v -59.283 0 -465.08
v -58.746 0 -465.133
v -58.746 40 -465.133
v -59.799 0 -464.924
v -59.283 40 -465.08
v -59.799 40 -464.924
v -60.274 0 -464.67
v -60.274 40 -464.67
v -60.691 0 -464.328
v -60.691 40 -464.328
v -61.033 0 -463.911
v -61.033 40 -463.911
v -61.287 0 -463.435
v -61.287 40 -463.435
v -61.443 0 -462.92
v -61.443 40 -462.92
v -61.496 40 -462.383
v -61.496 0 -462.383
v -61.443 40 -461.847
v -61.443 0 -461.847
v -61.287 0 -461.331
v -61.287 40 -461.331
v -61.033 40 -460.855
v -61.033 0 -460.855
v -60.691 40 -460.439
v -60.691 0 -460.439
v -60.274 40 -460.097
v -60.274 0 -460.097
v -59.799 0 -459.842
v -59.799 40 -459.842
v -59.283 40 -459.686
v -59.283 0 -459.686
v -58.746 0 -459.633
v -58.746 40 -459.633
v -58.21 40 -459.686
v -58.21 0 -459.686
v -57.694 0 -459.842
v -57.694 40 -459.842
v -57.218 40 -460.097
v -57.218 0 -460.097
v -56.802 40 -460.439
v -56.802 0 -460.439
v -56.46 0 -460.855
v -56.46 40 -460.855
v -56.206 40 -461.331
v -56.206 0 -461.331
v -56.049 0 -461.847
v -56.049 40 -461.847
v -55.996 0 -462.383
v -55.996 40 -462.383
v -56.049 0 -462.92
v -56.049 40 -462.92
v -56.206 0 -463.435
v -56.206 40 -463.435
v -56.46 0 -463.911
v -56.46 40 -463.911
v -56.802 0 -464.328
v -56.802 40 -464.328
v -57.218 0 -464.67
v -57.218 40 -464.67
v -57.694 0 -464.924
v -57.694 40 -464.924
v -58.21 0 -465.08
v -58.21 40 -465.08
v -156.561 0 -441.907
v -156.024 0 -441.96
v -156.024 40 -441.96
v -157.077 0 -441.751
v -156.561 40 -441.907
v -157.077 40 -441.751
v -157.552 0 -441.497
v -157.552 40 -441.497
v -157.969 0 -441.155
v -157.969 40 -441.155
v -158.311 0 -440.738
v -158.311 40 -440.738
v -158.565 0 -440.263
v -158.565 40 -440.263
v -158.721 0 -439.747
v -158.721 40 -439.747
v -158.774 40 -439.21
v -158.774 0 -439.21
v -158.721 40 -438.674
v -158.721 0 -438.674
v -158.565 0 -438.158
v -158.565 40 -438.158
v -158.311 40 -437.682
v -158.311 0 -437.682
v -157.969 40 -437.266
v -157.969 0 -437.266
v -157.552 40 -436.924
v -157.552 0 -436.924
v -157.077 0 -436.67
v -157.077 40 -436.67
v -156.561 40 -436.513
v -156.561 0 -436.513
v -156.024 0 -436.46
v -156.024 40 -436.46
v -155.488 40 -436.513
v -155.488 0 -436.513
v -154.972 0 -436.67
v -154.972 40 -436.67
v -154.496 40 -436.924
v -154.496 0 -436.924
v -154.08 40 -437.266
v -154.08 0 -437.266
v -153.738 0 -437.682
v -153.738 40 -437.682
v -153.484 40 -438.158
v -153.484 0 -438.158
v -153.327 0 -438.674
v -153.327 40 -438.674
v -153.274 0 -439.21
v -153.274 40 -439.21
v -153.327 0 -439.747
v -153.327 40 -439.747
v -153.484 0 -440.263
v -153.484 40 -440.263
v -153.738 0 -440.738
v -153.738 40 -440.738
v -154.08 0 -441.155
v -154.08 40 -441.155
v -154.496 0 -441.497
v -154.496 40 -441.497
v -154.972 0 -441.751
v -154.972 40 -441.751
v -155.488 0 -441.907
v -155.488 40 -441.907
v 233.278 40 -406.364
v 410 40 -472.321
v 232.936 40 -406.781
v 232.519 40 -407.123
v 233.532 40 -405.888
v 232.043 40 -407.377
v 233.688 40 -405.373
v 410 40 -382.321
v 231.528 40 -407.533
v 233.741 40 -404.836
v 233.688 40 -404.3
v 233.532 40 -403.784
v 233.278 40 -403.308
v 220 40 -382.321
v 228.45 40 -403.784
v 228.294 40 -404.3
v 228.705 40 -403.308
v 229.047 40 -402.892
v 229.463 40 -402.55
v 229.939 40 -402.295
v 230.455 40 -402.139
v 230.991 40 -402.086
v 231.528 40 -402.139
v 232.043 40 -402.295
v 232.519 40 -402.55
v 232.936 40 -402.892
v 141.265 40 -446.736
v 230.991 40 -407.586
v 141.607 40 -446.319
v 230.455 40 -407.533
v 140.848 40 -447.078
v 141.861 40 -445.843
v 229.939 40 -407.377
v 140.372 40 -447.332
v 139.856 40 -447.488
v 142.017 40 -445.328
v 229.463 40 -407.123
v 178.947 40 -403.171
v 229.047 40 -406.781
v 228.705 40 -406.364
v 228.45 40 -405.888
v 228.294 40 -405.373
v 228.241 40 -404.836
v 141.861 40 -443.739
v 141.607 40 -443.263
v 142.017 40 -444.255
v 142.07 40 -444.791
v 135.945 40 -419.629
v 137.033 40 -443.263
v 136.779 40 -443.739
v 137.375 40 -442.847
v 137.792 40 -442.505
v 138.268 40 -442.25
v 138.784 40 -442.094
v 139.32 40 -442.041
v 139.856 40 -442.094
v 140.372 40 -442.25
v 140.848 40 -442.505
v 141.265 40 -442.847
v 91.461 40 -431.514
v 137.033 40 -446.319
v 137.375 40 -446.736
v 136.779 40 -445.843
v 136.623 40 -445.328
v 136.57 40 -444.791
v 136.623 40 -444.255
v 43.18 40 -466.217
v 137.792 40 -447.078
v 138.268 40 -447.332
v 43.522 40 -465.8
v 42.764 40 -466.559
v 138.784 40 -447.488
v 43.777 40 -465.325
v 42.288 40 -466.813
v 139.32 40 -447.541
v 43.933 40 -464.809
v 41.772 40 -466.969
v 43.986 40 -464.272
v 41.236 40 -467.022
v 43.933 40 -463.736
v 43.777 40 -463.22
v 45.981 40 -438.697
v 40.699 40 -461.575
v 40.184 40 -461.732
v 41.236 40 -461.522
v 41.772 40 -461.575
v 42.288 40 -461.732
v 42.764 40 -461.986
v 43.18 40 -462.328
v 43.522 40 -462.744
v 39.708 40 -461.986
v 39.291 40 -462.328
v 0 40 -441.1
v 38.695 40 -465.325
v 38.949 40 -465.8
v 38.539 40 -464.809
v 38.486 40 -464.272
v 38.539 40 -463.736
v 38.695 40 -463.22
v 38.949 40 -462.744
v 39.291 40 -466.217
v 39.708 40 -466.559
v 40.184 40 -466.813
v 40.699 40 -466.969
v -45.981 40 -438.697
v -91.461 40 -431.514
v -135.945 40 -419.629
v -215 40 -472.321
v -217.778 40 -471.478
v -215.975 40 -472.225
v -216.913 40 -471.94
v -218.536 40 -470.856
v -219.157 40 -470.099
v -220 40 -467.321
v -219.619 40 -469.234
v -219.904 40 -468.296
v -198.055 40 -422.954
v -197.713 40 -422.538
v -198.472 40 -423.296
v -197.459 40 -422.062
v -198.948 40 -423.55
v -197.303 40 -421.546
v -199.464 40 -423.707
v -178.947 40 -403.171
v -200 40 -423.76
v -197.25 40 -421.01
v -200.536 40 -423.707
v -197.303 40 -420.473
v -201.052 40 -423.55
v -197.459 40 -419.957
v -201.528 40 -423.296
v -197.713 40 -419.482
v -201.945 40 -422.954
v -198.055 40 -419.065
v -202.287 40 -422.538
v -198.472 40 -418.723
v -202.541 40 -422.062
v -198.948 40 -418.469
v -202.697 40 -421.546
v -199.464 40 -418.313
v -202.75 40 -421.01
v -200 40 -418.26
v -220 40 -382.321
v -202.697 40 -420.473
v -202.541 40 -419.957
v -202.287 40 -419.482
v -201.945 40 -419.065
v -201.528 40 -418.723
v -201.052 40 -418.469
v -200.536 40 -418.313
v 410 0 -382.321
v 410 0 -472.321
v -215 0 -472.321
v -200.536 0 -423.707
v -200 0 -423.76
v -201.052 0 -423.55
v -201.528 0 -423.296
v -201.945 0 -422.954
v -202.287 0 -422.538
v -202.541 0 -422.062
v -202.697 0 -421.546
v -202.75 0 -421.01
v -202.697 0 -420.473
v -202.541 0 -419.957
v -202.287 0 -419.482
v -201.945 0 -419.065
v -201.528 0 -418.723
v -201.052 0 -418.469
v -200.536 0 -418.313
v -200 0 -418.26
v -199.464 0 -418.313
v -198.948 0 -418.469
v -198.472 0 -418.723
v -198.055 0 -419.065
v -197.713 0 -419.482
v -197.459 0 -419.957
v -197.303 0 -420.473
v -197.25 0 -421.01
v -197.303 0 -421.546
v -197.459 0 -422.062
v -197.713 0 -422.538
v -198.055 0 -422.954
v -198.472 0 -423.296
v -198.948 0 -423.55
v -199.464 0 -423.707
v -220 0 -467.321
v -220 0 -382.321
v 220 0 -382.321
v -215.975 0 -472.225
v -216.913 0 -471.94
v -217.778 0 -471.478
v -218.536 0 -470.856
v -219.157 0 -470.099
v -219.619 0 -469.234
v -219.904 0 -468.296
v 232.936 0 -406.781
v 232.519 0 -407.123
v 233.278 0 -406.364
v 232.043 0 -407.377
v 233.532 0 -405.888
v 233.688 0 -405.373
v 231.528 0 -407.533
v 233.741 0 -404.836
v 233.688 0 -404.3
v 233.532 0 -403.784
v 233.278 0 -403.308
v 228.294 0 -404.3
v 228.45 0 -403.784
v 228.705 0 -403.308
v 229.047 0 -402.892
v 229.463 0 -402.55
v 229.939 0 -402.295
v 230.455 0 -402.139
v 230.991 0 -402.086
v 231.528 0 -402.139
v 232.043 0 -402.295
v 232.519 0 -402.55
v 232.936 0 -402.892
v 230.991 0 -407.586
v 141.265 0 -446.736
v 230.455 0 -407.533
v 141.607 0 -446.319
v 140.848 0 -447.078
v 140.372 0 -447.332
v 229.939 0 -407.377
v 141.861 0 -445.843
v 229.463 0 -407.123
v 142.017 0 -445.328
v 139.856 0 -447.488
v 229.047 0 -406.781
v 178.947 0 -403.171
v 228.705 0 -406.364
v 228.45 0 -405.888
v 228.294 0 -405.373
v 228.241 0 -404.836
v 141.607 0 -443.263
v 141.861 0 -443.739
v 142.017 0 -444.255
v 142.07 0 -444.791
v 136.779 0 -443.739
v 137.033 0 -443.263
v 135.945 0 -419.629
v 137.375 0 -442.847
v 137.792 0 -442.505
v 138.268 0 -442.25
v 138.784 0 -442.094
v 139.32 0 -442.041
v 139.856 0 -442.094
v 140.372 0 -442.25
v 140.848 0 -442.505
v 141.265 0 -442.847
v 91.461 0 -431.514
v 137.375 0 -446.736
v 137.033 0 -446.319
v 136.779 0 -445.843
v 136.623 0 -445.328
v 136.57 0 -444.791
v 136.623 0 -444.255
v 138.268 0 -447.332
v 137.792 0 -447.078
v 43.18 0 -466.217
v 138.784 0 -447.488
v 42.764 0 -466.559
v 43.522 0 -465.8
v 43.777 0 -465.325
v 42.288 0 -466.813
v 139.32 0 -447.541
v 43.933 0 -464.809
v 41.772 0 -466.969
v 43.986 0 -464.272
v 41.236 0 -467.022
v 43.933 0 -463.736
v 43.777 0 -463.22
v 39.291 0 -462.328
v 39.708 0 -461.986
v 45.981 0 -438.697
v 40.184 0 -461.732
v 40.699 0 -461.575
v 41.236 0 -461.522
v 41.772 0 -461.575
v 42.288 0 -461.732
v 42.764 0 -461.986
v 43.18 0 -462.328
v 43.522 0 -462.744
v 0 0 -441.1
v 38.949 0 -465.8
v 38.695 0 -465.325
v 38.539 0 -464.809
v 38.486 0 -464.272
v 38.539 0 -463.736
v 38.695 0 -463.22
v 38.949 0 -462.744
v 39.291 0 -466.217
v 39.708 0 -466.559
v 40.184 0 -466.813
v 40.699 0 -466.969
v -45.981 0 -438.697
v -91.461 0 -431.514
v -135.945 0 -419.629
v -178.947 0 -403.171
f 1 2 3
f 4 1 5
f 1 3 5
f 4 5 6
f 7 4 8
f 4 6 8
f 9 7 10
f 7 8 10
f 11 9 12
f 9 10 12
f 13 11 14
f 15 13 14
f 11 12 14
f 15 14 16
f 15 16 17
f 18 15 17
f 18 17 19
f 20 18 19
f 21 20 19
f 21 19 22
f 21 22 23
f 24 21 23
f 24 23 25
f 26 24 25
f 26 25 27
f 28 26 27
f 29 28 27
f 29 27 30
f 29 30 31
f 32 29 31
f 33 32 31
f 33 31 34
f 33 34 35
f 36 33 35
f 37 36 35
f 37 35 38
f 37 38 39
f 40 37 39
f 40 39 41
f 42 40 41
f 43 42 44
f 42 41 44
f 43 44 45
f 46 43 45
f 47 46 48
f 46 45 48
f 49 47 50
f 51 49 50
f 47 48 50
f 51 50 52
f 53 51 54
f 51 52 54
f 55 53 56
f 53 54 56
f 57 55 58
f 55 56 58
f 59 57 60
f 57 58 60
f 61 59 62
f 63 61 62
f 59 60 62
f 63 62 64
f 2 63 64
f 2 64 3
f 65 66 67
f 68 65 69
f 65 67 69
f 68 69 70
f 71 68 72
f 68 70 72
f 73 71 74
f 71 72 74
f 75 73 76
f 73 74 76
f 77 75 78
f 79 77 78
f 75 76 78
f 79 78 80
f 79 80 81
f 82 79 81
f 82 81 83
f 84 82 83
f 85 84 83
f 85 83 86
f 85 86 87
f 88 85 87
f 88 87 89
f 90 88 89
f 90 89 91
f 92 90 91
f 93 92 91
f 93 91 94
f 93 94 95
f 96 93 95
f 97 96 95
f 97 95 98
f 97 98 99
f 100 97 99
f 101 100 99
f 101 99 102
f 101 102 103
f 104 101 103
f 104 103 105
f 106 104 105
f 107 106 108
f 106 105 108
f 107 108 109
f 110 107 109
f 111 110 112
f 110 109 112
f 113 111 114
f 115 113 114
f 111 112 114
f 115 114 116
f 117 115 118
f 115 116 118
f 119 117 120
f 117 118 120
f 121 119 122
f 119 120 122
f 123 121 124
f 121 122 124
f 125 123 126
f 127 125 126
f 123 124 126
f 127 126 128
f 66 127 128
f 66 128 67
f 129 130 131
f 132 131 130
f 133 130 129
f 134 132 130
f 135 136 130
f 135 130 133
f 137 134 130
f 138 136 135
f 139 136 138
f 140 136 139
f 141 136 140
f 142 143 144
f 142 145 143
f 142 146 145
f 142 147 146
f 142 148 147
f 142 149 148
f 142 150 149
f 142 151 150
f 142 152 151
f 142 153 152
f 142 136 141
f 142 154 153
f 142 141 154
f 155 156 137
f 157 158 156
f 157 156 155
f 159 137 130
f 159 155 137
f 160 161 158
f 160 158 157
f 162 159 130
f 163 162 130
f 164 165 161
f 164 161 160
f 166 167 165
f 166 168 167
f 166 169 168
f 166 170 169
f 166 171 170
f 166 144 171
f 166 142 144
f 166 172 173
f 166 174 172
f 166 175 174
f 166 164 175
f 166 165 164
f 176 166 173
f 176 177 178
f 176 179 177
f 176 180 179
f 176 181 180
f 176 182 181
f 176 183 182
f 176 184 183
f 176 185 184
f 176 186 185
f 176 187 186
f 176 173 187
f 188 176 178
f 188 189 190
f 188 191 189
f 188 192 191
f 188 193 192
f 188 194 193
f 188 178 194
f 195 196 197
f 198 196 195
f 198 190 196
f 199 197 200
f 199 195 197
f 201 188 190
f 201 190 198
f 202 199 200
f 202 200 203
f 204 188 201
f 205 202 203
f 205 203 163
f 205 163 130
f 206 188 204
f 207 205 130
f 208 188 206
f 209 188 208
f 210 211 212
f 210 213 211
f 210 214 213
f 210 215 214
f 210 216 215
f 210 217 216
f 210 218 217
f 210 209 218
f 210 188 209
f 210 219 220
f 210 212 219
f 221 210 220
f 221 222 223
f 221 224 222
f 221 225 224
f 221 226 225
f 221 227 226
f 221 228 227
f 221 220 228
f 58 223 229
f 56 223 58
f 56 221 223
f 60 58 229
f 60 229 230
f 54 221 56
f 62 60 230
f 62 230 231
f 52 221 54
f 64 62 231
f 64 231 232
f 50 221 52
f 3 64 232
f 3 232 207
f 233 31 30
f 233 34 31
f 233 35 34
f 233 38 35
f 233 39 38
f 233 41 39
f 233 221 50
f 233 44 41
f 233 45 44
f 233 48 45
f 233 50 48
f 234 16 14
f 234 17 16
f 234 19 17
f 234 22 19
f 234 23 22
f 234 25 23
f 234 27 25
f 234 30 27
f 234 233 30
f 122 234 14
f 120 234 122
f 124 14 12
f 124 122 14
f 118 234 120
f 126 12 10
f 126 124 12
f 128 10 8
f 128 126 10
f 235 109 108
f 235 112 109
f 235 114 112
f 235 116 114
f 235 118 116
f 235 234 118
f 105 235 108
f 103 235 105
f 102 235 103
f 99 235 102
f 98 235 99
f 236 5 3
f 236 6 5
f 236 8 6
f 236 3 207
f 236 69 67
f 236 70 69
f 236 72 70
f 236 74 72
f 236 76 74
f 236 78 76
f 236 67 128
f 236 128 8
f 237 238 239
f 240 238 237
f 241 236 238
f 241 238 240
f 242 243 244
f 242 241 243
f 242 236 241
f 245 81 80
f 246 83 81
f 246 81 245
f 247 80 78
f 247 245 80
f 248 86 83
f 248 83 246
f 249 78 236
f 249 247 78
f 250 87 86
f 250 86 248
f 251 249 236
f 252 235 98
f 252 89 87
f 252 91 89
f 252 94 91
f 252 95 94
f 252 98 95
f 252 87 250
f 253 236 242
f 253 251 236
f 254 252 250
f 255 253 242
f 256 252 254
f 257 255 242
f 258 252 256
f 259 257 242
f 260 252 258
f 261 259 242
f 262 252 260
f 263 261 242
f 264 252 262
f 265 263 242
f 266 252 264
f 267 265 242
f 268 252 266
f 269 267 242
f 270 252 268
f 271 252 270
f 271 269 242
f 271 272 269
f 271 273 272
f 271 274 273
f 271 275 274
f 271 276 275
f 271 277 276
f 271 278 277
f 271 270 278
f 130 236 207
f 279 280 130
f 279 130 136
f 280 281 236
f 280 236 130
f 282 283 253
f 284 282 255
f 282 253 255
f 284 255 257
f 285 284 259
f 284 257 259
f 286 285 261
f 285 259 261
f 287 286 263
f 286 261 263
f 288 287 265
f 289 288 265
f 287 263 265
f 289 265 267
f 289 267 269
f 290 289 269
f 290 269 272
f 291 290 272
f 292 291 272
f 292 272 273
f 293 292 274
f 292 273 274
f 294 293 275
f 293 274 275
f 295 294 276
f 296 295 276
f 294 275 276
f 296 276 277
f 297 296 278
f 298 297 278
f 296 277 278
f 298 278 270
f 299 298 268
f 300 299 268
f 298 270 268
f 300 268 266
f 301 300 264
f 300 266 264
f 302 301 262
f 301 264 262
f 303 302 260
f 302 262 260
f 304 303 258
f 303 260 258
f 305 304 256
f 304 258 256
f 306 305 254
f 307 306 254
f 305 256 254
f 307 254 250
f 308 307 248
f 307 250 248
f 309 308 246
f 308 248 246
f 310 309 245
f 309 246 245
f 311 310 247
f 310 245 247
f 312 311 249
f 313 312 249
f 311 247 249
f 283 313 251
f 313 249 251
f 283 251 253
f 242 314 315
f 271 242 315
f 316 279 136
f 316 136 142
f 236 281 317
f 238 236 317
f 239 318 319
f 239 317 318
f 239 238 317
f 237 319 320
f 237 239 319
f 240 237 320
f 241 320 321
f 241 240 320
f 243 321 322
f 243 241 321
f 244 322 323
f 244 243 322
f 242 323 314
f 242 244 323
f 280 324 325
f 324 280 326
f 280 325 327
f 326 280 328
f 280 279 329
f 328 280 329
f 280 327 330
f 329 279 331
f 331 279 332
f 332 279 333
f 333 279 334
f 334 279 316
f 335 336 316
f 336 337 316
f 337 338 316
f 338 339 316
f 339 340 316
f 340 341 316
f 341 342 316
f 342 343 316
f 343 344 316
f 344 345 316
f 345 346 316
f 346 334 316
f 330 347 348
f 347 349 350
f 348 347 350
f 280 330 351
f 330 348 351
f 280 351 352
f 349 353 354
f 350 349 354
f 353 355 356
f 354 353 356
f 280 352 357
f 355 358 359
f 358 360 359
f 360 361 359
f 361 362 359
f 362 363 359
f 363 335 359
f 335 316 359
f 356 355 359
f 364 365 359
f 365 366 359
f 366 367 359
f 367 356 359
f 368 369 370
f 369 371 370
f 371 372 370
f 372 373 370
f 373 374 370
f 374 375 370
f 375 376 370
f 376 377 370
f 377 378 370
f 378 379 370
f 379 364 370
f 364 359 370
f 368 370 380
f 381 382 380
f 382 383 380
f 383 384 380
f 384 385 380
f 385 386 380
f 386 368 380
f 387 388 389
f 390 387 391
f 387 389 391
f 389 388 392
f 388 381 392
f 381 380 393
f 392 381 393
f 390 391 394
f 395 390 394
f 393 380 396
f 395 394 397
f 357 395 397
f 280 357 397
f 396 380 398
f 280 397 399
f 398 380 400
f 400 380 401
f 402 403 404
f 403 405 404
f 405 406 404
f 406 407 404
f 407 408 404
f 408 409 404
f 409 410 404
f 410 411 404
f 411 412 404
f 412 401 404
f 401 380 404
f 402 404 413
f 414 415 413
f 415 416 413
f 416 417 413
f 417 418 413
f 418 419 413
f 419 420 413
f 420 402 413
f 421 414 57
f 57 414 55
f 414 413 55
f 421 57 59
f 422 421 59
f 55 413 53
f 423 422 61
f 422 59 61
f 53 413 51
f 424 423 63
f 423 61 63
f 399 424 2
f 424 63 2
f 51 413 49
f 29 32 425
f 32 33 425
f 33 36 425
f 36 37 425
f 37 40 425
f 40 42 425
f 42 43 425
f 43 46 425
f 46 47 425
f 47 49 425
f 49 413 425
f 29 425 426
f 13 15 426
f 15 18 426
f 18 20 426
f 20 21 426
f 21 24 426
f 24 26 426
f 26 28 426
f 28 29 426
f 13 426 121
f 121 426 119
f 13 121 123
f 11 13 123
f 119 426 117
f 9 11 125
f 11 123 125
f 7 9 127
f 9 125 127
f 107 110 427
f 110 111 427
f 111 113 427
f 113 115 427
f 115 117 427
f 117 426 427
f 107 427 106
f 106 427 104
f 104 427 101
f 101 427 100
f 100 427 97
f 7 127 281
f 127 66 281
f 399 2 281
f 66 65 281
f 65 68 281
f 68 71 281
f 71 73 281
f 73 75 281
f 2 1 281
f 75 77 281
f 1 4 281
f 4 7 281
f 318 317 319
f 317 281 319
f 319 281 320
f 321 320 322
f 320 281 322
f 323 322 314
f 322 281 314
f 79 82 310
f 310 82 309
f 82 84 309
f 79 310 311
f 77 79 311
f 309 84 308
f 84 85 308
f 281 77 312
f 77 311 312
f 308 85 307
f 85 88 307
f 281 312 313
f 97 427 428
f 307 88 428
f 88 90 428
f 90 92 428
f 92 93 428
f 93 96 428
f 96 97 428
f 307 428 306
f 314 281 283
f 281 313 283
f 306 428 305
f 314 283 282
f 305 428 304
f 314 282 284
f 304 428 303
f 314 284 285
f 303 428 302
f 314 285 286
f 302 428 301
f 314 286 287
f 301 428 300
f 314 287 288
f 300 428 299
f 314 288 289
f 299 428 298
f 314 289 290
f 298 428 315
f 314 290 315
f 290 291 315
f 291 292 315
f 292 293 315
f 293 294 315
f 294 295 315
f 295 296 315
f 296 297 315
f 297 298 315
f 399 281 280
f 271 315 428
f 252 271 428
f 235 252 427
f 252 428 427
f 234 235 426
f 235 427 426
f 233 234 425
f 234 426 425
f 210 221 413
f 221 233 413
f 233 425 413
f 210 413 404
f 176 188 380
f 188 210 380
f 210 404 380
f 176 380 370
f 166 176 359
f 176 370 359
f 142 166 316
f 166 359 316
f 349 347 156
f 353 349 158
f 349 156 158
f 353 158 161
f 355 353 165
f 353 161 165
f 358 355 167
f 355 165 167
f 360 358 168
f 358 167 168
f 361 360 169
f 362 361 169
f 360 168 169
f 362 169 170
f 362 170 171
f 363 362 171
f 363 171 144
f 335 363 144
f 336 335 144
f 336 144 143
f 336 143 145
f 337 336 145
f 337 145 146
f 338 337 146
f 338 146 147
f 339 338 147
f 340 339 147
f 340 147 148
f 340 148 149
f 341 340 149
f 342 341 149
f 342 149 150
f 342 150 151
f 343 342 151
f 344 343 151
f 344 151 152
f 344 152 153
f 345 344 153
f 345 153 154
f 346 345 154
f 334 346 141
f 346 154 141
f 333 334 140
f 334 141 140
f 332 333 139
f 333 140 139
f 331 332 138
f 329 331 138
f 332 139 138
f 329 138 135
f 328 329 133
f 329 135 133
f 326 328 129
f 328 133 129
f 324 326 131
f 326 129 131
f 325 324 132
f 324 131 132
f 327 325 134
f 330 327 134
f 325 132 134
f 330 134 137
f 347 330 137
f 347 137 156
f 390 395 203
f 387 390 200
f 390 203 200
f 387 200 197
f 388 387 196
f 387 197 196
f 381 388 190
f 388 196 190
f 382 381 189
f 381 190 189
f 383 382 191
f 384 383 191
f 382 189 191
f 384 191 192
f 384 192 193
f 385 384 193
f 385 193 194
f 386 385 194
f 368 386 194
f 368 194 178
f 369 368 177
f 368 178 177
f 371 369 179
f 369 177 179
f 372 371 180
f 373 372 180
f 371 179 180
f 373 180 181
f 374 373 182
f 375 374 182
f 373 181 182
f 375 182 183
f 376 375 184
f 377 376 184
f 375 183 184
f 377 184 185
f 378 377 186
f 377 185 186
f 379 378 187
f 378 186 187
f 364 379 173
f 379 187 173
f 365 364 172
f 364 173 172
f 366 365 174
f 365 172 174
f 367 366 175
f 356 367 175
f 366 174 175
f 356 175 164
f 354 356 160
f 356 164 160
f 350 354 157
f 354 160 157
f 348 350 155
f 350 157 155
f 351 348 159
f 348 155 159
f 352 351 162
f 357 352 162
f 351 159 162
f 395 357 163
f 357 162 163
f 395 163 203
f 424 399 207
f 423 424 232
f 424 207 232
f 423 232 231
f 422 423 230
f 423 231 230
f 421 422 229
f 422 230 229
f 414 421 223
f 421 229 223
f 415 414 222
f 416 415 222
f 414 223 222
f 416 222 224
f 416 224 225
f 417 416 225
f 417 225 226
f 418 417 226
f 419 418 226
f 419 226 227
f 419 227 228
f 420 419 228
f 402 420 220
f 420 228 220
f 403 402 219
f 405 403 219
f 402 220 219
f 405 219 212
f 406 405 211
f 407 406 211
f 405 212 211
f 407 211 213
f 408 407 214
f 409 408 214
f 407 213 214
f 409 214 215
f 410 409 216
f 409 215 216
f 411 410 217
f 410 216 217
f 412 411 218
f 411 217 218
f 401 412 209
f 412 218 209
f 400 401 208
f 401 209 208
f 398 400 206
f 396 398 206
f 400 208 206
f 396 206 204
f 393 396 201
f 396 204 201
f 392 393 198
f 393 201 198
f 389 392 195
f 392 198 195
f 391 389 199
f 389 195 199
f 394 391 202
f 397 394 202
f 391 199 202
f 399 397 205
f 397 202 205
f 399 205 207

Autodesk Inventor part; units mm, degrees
ref_plane "YZ Plane" through (0, 0, 0) normal (1, 0, 0) x (0, 1, 0)
ref_plane "XZ Plane" through (0, 0, 0) normal (0, 1, 0) x (-1, 0, 0)
ref_plane "XY Plane" through (0, 0, 0) normal (0, 0, 1) x (1, 0, 0)
sketch "Sketch1" plane through (0, 0, 0) normal (0, 1, 0) x (-1, 0, 0)
  line L0 (0, 329.241) -> (0, -329.241) construction
  line L1 (203.5937, 0) -> (-203.5937, 0) construction
  arc A0 (-441.1, 0) -> (220, -382.3208) centre (0, 0) ccw
  line L2 (-441.1, 0) -> (-441.1, 400)
  line L3 (-441.1, 400) -> (-500, 400)
  line L4 (-500, 400) -> (-500, -500)
  line L5 (-500, -500) -> (220, -500)
  line L6 (220, -500) -> (220, -382.3208)
  dimension "d0" = 500
  dimension "d1" = 400
  dimension "d2" = 500
  dimension "d3" = 441.1
  dimension "d4" = 720
extrude "Extrusion1" add sketch "Sketch1" along normal blind 40
sketch "Sketch3" plane through (0, 0, 0) normal (0, -1, 0) x (1, 0, 0)
  line L0 (-480, -472.3208) -> (410, -472.3208)
  line L1 (410, -472.3208) -> (410, -382.3208)
  line L2 (410, -382.3208) -> (-480, -382.3208)
  line L3 (-480, -382.3208) -> (-480, -472.3208)
  arc A0 (-220, -382.3208) -> (441.1, 0) centre (0, 0) ccw projected
  line L4 (500, 400) -> (500, -500) projected
  line L5 (-944.7434, 629.3425) -> (927.6453, 629.3425)
  line L6 (927.6453, 629.3425) -> (927.6453, -768.0218)
  line L7 (927.6453, -768.0218) -> (-944.7434, -768.0218)
  line L8 (-944.7434, -768.0218) -> (-944.7434, 629.3425)
  dimension "d44" = 890
  dimension "d45" = 90
  dimension "d71" = 90
sketch "Sketch4" plane through (0, 0, 0) normal (0, -1, 0) x (1, 0, 0)
  line L0 (441.1, 400) -> (500, 400) construction
  line L1 (441.1, 0) -> (441.1, 400) construction
  arc A0 (-220, -382.3208) -> (441.1, 0) centre (0, 0) ccw construction
  line L2 (464.3817, -39.9852) -> (0, 0) construction
  line L3 (0, 0) -> (445.1648, -138.1214) construction
  line L4 (423.7332, -194.1633) -> (0, 0) construction
  line L5 (360.2723, -295.7246) -> (0, 0) construction
  line L6 (289.0138, -365.6778) -> (0, 0) construction
  line L7 (389.8771, -255.4312) -> (0, 0) construction
  line L8 (326.5218, -332.615) -> (0, 0) construction
  line L9 (230.9911, -404.8361) -> (0, 0) construction
  line L10 (139.32, -444.7911) -> (0, 0) construction
  line L11 (41.2359, -464.2723) -> (0, 0) construction
  line L12 (464.3817, -39.9852) -> (445.1648, -138.1214) construction
  line L13 (445.1648, -138.1214) -> (423.7332, -194.1633) construction
  line L14 (423.7332, -194.1633) -> (389.8771, -255.4312) construction
  line L15 (389.8771, -255.4312) -> (360.2723, -295.7246) construction
  line L16 (360.2723, -295.7246) -> (326.5218, -332.615) construction
  line L17 (326.5218, -332.615) -> (289.0138, -365.6778) construction
  line L18 (289.0138, -365.6778) -> (230.9911, -404.8361) construction
  line L19 (230.9911, -404.8361) -> (139.32, -444.7911) construction
  line L20 (139.32, -444.7911) -> (41.2359, -464.2723) construction
  line L21 (-58.7462, -462.3831) -> (0, 0) construction
  line L22 (-156.0243, -439.2102) -> (0, 0) construction
  line L23 (-200, -421.0098) -> (0, 0) construction
  line L24 (41.2359, -464.2723) -> (-58.7462, -462.3831) construction
  line L25 (-58.7462, -462.3831) -> (-156.0243, -439.2102) construction
  line L26 (-200, -421.0098) -> (-156.0243, -439.2102) construction
  line L27 (-220, -500) -> (-220, -382.3208) construction
  point P0 (466.1, 360)
  point P1 (466.1, 260)
  point P2 (466.1, 160)
  point P3 (466.1, 60)
  dimension "d50" = 40
  dimension "d51" = 100
  dimension "d52" = 100
  dimension "d53" = 100
  dimension "d54" = 25
  dimension "d55" = 466.1
  dimension "d56" = 100
  dimension "d57" = 100
  dimension "d58" = 60
  dimension "d59" = 70
  dimension "d60" = 50
  dimension "d61" = 70
  dimension "d62" = 100
  dimension "d63" = 20
hole "Hole1" at (-200, 0, -421.0098) at (-156.0243, 0, -439.2102) at (-58.7462, 0, -462.3831) at (41.2359, 0, -464.2723) at (139.32, 0, -444.7911) at (230.9911, 0, -404.8361) at (289.0138, 0, -365.6778) at (326.5218, 0, -332.615) at (360.2723, 0, -295.7246) at (389.8771, 0, -255.4312) at (423.7332, 0, -194.1633) at (445.1648, 0, -138.1214) at (464.3817, 0, -39.9852) at (466.1, 0, 60) at (466.1, 0, 160) at (466.1, 0, 260) at (466.1, 0, 360) direction (0, 1, 0) diameter 5.5 end through all clearance for "Countersunk Flat Head Screw DIN EN ISO 2009" size "M5" standard "DIN"
extrude "Extrusion2" cut sketch "Sketch3" against normal through all
fillet "Fillet1" radius 5 1 edges at (-220, 20, -472.3208)
properties part number "boundaryV1"
